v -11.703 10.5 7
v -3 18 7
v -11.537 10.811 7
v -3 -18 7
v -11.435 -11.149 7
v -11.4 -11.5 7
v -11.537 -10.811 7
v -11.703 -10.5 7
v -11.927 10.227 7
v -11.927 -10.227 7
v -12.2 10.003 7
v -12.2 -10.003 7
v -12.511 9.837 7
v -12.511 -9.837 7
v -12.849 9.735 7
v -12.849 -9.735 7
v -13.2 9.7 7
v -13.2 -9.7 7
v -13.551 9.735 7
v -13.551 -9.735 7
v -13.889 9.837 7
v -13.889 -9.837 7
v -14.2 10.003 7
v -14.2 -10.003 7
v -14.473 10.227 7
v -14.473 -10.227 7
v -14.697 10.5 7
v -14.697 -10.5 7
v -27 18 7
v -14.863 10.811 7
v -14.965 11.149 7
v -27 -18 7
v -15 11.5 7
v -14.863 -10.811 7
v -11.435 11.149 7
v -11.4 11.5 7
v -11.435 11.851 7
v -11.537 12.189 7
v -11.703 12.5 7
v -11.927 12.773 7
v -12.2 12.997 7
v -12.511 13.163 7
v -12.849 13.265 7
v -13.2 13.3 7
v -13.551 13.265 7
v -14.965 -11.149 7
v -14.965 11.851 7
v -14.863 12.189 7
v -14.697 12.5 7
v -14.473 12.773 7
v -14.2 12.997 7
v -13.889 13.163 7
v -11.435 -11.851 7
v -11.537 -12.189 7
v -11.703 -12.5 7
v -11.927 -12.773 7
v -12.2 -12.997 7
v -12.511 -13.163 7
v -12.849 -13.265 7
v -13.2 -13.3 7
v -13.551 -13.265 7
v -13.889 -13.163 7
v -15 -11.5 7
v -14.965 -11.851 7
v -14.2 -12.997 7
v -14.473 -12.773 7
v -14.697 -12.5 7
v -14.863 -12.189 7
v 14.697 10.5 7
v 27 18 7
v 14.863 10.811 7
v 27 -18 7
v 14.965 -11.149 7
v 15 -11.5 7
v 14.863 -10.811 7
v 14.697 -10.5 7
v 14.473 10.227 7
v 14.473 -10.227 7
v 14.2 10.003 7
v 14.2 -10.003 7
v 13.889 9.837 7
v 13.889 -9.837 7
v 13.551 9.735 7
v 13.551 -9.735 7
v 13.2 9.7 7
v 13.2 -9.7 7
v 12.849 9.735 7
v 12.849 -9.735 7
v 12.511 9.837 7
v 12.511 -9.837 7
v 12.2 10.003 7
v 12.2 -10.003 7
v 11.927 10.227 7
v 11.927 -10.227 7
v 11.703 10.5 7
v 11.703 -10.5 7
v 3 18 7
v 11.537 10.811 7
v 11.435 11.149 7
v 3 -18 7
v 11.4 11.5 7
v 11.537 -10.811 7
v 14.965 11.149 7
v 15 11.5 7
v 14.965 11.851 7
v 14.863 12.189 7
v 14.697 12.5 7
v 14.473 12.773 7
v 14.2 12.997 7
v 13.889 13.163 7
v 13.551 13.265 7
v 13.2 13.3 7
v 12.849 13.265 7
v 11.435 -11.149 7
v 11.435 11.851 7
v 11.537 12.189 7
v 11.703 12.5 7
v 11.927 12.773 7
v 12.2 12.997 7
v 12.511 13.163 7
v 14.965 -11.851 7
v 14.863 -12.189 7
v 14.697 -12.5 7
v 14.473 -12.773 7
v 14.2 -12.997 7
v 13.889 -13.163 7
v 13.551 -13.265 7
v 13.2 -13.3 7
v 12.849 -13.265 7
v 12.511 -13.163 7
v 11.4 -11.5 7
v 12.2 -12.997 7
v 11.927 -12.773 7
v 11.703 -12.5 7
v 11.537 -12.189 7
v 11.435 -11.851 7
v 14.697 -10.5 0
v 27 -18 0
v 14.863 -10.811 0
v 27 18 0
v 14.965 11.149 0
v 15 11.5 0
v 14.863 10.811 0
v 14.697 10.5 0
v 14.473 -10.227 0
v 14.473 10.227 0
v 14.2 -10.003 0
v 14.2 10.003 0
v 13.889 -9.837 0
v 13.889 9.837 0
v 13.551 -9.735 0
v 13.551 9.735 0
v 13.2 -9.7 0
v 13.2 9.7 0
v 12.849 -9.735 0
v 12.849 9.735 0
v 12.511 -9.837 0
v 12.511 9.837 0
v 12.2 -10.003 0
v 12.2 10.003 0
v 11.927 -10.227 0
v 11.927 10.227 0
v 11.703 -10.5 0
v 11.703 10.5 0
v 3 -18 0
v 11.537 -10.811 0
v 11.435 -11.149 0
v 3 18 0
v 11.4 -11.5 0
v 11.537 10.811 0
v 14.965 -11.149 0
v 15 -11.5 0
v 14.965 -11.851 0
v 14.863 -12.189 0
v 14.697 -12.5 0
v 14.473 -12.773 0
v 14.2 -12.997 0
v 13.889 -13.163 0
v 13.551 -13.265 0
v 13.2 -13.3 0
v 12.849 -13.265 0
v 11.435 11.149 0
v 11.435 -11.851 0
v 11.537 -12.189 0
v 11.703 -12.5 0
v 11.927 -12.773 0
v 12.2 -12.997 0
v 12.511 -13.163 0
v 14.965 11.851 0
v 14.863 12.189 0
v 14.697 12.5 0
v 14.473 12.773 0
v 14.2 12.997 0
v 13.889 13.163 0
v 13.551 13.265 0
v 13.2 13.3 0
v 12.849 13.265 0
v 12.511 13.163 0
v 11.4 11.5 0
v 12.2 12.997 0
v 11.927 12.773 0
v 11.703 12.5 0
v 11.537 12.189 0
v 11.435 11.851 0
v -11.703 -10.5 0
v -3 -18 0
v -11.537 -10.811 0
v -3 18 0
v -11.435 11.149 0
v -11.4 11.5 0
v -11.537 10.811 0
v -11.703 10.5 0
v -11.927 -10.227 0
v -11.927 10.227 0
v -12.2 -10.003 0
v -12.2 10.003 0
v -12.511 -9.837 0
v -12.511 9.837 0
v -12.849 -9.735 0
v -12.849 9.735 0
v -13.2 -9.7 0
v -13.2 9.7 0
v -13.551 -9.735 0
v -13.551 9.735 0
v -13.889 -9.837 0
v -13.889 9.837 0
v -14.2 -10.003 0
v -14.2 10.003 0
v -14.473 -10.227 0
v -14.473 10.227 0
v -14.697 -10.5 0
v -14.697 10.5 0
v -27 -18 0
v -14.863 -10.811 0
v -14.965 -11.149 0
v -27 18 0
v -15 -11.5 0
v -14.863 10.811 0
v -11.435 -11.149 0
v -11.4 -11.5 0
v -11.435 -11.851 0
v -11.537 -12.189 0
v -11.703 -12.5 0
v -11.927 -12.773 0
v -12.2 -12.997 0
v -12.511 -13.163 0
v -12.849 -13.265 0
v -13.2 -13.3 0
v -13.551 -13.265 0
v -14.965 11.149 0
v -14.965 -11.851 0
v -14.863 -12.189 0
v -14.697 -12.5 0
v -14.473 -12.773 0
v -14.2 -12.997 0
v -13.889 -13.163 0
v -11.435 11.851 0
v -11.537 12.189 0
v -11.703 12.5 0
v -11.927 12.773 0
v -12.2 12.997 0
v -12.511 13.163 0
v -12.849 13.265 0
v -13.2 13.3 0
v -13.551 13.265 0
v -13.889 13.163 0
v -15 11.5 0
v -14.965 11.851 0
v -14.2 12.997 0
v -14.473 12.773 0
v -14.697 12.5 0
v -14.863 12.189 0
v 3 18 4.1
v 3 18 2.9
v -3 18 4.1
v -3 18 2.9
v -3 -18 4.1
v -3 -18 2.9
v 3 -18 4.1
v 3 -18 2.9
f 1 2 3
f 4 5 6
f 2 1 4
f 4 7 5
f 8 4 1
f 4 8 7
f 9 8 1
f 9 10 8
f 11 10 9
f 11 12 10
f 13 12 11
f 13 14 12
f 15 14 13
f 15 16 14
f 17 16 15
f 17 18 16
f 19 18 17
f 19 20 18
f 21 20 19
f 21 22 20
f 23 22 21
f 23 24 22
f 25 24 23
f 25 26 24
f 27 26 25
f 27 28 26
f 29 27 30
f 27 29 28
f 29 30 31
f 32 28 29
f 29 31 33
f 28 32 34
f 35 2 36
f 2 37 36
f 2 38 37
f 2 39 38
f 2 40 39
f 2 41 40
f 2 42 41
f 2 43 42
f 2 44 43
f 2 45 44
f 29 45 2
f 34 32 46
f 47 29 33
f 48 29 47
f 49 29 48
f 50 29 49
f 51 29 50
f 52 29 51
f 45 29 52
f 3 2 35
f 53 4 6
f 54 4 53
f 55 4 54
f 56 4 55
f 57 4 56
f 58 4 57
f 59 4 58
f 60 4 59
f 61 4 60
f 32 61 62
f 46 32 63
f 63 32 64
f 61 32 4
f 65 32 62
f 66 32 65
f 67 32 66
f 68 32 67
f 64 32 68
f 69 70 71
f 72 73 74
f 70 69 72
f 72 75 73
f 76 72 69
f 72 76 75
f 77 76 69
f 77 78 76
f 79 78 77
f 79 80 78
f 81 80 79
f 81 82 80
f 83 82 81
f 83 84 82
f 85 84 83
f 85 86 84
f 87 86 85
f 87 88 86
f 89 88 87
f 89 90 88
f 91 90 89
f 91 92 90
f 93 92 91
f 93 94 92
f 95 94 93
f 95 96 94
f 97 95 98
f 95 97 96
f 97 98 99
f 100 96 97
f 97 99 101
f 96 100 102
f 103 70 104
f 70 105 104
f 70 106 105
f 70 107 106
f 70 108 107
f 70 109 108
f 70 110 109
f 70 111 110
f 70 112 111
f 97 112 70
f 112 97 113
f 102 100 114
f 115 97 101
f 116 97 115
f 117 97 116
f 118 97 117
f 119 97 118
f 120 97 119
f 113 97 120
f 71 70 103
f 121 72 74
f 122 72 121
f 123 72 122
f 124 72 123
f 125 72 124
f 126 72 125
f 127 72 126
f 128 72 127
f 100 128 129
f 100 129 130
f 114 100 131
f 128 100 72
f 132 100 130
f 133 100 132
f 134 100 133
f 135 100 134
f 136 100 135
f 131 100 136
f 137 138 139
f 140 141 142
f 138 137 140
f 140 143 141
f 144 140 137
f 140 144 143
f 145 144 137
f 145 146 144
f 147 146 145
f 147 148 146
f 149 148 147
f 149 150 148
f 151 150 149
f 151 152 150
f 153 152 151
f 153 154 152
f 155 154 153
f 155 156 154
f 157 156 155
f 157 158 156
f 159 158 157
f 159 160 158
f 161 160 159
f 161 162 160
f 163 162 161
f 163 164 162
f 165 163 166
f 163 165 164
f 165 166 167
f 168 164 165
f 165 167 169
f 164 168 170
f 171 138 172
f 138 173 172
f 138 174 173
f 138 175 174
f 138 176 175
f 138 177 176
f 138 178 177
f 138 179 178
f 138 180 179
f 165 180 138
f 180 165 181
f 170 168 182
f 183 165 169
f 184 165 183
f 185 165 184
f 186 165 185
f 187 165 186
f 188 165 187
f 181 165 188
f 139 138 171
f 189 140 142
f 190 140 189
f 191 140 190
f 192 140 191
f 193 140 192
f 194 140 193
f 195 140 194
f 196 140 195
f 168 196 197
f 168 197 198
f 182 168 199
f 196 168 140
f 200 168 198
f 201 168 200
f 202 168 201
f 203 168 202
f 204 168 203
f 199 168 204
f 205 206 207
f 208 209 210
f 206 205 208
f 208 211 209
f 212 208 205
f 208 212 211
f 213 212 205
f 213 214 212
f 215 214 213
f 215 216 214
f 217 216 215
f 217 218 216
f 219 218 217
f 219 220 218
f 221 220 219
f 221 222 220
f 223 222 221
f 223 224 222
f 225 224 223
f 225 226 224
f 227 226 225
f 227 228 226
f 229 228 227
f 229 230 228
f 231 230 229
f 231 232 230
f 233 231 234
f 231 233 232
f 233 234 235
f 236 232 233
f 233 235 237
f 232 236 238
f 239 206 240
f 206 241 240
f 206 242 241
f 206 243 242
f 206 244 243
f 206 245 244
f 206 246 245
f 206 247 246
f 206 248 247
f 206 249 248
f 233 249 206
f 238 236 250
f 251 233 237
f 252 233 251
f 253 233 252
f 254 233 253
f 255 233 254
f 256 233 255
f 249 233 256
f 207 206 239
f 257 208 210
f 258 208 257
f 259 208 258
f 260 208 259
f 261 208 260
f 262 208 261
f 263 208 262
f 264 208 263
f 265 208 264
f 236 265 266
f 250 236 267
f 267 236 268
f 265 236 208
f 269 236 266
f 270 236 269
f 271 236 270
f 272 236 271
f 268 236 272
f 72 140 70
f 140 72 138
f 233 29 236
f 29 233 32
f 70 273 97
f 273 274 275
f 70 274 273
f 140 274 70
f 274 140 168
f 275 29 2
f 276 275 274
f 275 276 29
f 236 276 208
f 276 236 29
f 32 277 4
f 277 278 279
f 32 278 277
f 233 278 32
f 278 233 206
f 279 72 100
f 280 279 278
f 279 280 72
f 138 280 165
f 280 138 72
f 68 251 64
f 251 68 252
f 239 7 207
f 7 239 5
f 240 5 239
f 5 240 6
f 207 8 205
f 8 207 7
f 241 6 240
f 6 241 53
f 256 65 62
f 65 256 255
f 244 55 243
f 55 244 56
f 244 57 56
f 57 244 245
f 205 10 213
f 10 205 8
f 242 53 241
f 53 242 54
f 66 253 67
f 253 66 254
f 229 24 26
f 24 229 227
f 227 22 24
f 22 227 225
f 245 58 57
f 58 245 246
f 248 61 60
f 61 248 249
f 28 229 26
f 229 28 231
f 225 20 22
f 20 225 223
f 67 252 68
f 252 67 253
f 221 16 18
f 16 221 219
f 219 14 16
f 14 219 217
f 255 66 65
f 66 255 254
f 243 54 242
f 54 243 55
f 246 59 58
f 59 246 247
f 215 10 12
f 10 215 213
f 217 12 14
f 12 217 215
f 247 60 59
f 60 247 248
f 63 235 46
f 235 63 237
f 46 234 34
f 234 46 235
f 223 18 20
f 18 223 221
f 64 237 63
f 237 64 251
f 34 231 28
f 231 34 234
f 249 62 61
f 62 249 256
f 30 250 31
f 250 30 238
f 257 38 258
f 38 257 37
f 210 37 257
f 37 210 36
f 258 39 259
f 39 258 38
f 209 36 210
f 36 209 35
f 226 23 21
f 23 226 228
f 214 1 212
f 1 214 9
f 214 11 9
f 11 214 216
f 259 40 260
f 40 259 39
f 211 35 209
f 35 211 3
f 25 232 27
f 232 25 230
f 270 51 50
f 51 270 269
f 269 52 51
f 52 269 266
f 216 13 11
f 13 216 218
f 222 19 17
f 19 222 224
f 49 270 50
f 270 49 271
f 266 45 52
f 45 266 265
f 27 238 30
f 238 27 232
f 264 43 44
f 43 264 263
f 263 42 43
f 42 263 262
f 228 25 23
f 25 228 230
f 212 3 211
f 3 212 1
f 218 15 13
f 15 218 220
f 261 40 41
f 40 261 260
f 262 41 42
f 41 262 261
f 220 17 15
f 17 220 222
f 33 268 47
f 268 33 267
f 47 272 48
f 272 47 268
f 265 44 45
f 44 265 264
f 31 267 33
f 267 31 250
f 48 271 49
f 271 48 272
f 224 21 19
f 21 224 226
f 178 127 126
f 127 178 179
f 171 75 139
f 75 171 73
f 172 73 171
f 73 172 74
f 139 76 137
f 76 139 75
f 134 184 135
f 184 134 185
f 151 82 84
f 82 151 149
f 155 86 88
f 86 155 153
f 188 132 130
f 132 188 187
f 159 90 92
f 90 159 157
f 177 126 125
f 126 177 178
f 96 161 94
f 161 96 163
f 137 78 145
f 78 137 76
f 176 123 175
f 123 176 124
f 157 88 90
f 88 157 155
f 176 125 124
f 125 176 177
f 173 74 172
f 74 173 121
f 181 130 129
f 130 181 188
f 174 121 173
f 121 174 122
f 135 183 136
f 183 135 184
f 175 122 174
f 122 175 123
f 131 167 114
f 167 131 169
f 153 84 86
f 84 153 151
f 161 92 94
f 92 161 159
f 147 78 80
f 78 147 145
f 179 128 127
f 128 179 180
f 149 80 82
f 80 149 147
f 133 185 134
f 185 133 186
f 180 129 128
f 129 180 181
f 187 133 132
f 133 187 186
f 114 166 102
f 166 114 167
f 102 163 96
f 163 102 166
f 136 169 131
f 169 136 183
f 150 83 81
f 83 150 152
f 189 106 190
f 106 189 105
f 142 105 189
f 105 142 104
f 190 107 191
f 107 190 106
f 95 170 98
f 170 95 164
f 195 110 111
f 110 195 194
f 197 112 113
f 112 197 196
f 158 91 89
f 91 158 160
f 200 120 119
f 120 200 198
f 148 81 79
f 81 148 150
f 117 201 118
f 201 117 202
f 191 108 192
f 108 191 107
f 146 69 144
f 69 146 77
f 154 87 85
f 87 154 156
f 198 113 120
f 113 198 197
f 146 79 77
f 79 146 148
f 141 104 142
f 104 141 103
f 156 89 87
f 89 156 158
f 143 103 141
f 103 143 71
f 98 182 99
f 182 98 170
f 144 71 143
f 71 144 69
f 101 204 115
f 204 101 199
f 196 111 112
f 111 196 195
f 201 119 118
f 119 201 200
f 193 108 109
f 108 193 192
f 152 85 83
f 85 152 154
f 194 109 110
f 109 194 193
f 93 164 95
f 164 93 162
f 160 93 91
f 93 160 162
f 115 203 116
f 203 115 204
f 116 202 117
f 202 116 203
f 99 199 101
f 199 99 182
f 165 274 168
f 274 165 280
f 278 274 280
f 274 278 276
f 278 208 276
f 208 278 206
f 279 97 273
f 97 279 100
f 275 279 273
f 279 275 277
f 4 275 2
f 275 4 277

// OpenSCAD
$fn = 32;

// ----------------------------------------------------------------------
// Living hinge: 54 x 36 mm plates, 1.2 mm flexible web
// ----------------------------------------------------------------------

// --- parameters (mm) ---
plate_len = 24;           // plate length outside the web
plate_w = 36;             // plate width
thick = 7;                // plate thickness
web_half = 3;             // half width of the flex band
web_t = 1.2;              // flexible web thickness
web_z = 2.9;              // web position inside the thickness
boss_d = 9;               // screw boss diameter
boss_h = 7;               // screw boss height
boss_x = 13.2;            // screw boss distance from the web
screw_d = 3.6;            // screw hole

difference() {
  union() {
    /* one flat strip, later thinned at the middle */
    translate([-27, -18, 0]) cube([54, 36, 7]);
    /* screw bosses, sunk 0.5 mm into the plates */
    for (sx = [-13.2, 13.2]) {
      for (sy = [-11.5, 11.5]) {
        translate([sx, sy, 0]) cylinder(h = boss_h, d = boss_d);
      }
    }
  }
  /* channel from below: leaves the web on top of it */
  translate([-3, -20.5, -2.5]) cube([6, 41, 5.4]);
  /* channel from above: thins the web down to web_t */
  translate([-3, -20.5, 4.1]) cube([6, 41, 5.4]);
  /* screw holes through the bosses */
  for (sx = [-13.2, 13.2]) {
    for (sy = [-11.5, 11.5]) {
      translate([sx, sy, -2.5]) cylinder(h = boss_h + 5, d = screw_d);
    }
  }
}
